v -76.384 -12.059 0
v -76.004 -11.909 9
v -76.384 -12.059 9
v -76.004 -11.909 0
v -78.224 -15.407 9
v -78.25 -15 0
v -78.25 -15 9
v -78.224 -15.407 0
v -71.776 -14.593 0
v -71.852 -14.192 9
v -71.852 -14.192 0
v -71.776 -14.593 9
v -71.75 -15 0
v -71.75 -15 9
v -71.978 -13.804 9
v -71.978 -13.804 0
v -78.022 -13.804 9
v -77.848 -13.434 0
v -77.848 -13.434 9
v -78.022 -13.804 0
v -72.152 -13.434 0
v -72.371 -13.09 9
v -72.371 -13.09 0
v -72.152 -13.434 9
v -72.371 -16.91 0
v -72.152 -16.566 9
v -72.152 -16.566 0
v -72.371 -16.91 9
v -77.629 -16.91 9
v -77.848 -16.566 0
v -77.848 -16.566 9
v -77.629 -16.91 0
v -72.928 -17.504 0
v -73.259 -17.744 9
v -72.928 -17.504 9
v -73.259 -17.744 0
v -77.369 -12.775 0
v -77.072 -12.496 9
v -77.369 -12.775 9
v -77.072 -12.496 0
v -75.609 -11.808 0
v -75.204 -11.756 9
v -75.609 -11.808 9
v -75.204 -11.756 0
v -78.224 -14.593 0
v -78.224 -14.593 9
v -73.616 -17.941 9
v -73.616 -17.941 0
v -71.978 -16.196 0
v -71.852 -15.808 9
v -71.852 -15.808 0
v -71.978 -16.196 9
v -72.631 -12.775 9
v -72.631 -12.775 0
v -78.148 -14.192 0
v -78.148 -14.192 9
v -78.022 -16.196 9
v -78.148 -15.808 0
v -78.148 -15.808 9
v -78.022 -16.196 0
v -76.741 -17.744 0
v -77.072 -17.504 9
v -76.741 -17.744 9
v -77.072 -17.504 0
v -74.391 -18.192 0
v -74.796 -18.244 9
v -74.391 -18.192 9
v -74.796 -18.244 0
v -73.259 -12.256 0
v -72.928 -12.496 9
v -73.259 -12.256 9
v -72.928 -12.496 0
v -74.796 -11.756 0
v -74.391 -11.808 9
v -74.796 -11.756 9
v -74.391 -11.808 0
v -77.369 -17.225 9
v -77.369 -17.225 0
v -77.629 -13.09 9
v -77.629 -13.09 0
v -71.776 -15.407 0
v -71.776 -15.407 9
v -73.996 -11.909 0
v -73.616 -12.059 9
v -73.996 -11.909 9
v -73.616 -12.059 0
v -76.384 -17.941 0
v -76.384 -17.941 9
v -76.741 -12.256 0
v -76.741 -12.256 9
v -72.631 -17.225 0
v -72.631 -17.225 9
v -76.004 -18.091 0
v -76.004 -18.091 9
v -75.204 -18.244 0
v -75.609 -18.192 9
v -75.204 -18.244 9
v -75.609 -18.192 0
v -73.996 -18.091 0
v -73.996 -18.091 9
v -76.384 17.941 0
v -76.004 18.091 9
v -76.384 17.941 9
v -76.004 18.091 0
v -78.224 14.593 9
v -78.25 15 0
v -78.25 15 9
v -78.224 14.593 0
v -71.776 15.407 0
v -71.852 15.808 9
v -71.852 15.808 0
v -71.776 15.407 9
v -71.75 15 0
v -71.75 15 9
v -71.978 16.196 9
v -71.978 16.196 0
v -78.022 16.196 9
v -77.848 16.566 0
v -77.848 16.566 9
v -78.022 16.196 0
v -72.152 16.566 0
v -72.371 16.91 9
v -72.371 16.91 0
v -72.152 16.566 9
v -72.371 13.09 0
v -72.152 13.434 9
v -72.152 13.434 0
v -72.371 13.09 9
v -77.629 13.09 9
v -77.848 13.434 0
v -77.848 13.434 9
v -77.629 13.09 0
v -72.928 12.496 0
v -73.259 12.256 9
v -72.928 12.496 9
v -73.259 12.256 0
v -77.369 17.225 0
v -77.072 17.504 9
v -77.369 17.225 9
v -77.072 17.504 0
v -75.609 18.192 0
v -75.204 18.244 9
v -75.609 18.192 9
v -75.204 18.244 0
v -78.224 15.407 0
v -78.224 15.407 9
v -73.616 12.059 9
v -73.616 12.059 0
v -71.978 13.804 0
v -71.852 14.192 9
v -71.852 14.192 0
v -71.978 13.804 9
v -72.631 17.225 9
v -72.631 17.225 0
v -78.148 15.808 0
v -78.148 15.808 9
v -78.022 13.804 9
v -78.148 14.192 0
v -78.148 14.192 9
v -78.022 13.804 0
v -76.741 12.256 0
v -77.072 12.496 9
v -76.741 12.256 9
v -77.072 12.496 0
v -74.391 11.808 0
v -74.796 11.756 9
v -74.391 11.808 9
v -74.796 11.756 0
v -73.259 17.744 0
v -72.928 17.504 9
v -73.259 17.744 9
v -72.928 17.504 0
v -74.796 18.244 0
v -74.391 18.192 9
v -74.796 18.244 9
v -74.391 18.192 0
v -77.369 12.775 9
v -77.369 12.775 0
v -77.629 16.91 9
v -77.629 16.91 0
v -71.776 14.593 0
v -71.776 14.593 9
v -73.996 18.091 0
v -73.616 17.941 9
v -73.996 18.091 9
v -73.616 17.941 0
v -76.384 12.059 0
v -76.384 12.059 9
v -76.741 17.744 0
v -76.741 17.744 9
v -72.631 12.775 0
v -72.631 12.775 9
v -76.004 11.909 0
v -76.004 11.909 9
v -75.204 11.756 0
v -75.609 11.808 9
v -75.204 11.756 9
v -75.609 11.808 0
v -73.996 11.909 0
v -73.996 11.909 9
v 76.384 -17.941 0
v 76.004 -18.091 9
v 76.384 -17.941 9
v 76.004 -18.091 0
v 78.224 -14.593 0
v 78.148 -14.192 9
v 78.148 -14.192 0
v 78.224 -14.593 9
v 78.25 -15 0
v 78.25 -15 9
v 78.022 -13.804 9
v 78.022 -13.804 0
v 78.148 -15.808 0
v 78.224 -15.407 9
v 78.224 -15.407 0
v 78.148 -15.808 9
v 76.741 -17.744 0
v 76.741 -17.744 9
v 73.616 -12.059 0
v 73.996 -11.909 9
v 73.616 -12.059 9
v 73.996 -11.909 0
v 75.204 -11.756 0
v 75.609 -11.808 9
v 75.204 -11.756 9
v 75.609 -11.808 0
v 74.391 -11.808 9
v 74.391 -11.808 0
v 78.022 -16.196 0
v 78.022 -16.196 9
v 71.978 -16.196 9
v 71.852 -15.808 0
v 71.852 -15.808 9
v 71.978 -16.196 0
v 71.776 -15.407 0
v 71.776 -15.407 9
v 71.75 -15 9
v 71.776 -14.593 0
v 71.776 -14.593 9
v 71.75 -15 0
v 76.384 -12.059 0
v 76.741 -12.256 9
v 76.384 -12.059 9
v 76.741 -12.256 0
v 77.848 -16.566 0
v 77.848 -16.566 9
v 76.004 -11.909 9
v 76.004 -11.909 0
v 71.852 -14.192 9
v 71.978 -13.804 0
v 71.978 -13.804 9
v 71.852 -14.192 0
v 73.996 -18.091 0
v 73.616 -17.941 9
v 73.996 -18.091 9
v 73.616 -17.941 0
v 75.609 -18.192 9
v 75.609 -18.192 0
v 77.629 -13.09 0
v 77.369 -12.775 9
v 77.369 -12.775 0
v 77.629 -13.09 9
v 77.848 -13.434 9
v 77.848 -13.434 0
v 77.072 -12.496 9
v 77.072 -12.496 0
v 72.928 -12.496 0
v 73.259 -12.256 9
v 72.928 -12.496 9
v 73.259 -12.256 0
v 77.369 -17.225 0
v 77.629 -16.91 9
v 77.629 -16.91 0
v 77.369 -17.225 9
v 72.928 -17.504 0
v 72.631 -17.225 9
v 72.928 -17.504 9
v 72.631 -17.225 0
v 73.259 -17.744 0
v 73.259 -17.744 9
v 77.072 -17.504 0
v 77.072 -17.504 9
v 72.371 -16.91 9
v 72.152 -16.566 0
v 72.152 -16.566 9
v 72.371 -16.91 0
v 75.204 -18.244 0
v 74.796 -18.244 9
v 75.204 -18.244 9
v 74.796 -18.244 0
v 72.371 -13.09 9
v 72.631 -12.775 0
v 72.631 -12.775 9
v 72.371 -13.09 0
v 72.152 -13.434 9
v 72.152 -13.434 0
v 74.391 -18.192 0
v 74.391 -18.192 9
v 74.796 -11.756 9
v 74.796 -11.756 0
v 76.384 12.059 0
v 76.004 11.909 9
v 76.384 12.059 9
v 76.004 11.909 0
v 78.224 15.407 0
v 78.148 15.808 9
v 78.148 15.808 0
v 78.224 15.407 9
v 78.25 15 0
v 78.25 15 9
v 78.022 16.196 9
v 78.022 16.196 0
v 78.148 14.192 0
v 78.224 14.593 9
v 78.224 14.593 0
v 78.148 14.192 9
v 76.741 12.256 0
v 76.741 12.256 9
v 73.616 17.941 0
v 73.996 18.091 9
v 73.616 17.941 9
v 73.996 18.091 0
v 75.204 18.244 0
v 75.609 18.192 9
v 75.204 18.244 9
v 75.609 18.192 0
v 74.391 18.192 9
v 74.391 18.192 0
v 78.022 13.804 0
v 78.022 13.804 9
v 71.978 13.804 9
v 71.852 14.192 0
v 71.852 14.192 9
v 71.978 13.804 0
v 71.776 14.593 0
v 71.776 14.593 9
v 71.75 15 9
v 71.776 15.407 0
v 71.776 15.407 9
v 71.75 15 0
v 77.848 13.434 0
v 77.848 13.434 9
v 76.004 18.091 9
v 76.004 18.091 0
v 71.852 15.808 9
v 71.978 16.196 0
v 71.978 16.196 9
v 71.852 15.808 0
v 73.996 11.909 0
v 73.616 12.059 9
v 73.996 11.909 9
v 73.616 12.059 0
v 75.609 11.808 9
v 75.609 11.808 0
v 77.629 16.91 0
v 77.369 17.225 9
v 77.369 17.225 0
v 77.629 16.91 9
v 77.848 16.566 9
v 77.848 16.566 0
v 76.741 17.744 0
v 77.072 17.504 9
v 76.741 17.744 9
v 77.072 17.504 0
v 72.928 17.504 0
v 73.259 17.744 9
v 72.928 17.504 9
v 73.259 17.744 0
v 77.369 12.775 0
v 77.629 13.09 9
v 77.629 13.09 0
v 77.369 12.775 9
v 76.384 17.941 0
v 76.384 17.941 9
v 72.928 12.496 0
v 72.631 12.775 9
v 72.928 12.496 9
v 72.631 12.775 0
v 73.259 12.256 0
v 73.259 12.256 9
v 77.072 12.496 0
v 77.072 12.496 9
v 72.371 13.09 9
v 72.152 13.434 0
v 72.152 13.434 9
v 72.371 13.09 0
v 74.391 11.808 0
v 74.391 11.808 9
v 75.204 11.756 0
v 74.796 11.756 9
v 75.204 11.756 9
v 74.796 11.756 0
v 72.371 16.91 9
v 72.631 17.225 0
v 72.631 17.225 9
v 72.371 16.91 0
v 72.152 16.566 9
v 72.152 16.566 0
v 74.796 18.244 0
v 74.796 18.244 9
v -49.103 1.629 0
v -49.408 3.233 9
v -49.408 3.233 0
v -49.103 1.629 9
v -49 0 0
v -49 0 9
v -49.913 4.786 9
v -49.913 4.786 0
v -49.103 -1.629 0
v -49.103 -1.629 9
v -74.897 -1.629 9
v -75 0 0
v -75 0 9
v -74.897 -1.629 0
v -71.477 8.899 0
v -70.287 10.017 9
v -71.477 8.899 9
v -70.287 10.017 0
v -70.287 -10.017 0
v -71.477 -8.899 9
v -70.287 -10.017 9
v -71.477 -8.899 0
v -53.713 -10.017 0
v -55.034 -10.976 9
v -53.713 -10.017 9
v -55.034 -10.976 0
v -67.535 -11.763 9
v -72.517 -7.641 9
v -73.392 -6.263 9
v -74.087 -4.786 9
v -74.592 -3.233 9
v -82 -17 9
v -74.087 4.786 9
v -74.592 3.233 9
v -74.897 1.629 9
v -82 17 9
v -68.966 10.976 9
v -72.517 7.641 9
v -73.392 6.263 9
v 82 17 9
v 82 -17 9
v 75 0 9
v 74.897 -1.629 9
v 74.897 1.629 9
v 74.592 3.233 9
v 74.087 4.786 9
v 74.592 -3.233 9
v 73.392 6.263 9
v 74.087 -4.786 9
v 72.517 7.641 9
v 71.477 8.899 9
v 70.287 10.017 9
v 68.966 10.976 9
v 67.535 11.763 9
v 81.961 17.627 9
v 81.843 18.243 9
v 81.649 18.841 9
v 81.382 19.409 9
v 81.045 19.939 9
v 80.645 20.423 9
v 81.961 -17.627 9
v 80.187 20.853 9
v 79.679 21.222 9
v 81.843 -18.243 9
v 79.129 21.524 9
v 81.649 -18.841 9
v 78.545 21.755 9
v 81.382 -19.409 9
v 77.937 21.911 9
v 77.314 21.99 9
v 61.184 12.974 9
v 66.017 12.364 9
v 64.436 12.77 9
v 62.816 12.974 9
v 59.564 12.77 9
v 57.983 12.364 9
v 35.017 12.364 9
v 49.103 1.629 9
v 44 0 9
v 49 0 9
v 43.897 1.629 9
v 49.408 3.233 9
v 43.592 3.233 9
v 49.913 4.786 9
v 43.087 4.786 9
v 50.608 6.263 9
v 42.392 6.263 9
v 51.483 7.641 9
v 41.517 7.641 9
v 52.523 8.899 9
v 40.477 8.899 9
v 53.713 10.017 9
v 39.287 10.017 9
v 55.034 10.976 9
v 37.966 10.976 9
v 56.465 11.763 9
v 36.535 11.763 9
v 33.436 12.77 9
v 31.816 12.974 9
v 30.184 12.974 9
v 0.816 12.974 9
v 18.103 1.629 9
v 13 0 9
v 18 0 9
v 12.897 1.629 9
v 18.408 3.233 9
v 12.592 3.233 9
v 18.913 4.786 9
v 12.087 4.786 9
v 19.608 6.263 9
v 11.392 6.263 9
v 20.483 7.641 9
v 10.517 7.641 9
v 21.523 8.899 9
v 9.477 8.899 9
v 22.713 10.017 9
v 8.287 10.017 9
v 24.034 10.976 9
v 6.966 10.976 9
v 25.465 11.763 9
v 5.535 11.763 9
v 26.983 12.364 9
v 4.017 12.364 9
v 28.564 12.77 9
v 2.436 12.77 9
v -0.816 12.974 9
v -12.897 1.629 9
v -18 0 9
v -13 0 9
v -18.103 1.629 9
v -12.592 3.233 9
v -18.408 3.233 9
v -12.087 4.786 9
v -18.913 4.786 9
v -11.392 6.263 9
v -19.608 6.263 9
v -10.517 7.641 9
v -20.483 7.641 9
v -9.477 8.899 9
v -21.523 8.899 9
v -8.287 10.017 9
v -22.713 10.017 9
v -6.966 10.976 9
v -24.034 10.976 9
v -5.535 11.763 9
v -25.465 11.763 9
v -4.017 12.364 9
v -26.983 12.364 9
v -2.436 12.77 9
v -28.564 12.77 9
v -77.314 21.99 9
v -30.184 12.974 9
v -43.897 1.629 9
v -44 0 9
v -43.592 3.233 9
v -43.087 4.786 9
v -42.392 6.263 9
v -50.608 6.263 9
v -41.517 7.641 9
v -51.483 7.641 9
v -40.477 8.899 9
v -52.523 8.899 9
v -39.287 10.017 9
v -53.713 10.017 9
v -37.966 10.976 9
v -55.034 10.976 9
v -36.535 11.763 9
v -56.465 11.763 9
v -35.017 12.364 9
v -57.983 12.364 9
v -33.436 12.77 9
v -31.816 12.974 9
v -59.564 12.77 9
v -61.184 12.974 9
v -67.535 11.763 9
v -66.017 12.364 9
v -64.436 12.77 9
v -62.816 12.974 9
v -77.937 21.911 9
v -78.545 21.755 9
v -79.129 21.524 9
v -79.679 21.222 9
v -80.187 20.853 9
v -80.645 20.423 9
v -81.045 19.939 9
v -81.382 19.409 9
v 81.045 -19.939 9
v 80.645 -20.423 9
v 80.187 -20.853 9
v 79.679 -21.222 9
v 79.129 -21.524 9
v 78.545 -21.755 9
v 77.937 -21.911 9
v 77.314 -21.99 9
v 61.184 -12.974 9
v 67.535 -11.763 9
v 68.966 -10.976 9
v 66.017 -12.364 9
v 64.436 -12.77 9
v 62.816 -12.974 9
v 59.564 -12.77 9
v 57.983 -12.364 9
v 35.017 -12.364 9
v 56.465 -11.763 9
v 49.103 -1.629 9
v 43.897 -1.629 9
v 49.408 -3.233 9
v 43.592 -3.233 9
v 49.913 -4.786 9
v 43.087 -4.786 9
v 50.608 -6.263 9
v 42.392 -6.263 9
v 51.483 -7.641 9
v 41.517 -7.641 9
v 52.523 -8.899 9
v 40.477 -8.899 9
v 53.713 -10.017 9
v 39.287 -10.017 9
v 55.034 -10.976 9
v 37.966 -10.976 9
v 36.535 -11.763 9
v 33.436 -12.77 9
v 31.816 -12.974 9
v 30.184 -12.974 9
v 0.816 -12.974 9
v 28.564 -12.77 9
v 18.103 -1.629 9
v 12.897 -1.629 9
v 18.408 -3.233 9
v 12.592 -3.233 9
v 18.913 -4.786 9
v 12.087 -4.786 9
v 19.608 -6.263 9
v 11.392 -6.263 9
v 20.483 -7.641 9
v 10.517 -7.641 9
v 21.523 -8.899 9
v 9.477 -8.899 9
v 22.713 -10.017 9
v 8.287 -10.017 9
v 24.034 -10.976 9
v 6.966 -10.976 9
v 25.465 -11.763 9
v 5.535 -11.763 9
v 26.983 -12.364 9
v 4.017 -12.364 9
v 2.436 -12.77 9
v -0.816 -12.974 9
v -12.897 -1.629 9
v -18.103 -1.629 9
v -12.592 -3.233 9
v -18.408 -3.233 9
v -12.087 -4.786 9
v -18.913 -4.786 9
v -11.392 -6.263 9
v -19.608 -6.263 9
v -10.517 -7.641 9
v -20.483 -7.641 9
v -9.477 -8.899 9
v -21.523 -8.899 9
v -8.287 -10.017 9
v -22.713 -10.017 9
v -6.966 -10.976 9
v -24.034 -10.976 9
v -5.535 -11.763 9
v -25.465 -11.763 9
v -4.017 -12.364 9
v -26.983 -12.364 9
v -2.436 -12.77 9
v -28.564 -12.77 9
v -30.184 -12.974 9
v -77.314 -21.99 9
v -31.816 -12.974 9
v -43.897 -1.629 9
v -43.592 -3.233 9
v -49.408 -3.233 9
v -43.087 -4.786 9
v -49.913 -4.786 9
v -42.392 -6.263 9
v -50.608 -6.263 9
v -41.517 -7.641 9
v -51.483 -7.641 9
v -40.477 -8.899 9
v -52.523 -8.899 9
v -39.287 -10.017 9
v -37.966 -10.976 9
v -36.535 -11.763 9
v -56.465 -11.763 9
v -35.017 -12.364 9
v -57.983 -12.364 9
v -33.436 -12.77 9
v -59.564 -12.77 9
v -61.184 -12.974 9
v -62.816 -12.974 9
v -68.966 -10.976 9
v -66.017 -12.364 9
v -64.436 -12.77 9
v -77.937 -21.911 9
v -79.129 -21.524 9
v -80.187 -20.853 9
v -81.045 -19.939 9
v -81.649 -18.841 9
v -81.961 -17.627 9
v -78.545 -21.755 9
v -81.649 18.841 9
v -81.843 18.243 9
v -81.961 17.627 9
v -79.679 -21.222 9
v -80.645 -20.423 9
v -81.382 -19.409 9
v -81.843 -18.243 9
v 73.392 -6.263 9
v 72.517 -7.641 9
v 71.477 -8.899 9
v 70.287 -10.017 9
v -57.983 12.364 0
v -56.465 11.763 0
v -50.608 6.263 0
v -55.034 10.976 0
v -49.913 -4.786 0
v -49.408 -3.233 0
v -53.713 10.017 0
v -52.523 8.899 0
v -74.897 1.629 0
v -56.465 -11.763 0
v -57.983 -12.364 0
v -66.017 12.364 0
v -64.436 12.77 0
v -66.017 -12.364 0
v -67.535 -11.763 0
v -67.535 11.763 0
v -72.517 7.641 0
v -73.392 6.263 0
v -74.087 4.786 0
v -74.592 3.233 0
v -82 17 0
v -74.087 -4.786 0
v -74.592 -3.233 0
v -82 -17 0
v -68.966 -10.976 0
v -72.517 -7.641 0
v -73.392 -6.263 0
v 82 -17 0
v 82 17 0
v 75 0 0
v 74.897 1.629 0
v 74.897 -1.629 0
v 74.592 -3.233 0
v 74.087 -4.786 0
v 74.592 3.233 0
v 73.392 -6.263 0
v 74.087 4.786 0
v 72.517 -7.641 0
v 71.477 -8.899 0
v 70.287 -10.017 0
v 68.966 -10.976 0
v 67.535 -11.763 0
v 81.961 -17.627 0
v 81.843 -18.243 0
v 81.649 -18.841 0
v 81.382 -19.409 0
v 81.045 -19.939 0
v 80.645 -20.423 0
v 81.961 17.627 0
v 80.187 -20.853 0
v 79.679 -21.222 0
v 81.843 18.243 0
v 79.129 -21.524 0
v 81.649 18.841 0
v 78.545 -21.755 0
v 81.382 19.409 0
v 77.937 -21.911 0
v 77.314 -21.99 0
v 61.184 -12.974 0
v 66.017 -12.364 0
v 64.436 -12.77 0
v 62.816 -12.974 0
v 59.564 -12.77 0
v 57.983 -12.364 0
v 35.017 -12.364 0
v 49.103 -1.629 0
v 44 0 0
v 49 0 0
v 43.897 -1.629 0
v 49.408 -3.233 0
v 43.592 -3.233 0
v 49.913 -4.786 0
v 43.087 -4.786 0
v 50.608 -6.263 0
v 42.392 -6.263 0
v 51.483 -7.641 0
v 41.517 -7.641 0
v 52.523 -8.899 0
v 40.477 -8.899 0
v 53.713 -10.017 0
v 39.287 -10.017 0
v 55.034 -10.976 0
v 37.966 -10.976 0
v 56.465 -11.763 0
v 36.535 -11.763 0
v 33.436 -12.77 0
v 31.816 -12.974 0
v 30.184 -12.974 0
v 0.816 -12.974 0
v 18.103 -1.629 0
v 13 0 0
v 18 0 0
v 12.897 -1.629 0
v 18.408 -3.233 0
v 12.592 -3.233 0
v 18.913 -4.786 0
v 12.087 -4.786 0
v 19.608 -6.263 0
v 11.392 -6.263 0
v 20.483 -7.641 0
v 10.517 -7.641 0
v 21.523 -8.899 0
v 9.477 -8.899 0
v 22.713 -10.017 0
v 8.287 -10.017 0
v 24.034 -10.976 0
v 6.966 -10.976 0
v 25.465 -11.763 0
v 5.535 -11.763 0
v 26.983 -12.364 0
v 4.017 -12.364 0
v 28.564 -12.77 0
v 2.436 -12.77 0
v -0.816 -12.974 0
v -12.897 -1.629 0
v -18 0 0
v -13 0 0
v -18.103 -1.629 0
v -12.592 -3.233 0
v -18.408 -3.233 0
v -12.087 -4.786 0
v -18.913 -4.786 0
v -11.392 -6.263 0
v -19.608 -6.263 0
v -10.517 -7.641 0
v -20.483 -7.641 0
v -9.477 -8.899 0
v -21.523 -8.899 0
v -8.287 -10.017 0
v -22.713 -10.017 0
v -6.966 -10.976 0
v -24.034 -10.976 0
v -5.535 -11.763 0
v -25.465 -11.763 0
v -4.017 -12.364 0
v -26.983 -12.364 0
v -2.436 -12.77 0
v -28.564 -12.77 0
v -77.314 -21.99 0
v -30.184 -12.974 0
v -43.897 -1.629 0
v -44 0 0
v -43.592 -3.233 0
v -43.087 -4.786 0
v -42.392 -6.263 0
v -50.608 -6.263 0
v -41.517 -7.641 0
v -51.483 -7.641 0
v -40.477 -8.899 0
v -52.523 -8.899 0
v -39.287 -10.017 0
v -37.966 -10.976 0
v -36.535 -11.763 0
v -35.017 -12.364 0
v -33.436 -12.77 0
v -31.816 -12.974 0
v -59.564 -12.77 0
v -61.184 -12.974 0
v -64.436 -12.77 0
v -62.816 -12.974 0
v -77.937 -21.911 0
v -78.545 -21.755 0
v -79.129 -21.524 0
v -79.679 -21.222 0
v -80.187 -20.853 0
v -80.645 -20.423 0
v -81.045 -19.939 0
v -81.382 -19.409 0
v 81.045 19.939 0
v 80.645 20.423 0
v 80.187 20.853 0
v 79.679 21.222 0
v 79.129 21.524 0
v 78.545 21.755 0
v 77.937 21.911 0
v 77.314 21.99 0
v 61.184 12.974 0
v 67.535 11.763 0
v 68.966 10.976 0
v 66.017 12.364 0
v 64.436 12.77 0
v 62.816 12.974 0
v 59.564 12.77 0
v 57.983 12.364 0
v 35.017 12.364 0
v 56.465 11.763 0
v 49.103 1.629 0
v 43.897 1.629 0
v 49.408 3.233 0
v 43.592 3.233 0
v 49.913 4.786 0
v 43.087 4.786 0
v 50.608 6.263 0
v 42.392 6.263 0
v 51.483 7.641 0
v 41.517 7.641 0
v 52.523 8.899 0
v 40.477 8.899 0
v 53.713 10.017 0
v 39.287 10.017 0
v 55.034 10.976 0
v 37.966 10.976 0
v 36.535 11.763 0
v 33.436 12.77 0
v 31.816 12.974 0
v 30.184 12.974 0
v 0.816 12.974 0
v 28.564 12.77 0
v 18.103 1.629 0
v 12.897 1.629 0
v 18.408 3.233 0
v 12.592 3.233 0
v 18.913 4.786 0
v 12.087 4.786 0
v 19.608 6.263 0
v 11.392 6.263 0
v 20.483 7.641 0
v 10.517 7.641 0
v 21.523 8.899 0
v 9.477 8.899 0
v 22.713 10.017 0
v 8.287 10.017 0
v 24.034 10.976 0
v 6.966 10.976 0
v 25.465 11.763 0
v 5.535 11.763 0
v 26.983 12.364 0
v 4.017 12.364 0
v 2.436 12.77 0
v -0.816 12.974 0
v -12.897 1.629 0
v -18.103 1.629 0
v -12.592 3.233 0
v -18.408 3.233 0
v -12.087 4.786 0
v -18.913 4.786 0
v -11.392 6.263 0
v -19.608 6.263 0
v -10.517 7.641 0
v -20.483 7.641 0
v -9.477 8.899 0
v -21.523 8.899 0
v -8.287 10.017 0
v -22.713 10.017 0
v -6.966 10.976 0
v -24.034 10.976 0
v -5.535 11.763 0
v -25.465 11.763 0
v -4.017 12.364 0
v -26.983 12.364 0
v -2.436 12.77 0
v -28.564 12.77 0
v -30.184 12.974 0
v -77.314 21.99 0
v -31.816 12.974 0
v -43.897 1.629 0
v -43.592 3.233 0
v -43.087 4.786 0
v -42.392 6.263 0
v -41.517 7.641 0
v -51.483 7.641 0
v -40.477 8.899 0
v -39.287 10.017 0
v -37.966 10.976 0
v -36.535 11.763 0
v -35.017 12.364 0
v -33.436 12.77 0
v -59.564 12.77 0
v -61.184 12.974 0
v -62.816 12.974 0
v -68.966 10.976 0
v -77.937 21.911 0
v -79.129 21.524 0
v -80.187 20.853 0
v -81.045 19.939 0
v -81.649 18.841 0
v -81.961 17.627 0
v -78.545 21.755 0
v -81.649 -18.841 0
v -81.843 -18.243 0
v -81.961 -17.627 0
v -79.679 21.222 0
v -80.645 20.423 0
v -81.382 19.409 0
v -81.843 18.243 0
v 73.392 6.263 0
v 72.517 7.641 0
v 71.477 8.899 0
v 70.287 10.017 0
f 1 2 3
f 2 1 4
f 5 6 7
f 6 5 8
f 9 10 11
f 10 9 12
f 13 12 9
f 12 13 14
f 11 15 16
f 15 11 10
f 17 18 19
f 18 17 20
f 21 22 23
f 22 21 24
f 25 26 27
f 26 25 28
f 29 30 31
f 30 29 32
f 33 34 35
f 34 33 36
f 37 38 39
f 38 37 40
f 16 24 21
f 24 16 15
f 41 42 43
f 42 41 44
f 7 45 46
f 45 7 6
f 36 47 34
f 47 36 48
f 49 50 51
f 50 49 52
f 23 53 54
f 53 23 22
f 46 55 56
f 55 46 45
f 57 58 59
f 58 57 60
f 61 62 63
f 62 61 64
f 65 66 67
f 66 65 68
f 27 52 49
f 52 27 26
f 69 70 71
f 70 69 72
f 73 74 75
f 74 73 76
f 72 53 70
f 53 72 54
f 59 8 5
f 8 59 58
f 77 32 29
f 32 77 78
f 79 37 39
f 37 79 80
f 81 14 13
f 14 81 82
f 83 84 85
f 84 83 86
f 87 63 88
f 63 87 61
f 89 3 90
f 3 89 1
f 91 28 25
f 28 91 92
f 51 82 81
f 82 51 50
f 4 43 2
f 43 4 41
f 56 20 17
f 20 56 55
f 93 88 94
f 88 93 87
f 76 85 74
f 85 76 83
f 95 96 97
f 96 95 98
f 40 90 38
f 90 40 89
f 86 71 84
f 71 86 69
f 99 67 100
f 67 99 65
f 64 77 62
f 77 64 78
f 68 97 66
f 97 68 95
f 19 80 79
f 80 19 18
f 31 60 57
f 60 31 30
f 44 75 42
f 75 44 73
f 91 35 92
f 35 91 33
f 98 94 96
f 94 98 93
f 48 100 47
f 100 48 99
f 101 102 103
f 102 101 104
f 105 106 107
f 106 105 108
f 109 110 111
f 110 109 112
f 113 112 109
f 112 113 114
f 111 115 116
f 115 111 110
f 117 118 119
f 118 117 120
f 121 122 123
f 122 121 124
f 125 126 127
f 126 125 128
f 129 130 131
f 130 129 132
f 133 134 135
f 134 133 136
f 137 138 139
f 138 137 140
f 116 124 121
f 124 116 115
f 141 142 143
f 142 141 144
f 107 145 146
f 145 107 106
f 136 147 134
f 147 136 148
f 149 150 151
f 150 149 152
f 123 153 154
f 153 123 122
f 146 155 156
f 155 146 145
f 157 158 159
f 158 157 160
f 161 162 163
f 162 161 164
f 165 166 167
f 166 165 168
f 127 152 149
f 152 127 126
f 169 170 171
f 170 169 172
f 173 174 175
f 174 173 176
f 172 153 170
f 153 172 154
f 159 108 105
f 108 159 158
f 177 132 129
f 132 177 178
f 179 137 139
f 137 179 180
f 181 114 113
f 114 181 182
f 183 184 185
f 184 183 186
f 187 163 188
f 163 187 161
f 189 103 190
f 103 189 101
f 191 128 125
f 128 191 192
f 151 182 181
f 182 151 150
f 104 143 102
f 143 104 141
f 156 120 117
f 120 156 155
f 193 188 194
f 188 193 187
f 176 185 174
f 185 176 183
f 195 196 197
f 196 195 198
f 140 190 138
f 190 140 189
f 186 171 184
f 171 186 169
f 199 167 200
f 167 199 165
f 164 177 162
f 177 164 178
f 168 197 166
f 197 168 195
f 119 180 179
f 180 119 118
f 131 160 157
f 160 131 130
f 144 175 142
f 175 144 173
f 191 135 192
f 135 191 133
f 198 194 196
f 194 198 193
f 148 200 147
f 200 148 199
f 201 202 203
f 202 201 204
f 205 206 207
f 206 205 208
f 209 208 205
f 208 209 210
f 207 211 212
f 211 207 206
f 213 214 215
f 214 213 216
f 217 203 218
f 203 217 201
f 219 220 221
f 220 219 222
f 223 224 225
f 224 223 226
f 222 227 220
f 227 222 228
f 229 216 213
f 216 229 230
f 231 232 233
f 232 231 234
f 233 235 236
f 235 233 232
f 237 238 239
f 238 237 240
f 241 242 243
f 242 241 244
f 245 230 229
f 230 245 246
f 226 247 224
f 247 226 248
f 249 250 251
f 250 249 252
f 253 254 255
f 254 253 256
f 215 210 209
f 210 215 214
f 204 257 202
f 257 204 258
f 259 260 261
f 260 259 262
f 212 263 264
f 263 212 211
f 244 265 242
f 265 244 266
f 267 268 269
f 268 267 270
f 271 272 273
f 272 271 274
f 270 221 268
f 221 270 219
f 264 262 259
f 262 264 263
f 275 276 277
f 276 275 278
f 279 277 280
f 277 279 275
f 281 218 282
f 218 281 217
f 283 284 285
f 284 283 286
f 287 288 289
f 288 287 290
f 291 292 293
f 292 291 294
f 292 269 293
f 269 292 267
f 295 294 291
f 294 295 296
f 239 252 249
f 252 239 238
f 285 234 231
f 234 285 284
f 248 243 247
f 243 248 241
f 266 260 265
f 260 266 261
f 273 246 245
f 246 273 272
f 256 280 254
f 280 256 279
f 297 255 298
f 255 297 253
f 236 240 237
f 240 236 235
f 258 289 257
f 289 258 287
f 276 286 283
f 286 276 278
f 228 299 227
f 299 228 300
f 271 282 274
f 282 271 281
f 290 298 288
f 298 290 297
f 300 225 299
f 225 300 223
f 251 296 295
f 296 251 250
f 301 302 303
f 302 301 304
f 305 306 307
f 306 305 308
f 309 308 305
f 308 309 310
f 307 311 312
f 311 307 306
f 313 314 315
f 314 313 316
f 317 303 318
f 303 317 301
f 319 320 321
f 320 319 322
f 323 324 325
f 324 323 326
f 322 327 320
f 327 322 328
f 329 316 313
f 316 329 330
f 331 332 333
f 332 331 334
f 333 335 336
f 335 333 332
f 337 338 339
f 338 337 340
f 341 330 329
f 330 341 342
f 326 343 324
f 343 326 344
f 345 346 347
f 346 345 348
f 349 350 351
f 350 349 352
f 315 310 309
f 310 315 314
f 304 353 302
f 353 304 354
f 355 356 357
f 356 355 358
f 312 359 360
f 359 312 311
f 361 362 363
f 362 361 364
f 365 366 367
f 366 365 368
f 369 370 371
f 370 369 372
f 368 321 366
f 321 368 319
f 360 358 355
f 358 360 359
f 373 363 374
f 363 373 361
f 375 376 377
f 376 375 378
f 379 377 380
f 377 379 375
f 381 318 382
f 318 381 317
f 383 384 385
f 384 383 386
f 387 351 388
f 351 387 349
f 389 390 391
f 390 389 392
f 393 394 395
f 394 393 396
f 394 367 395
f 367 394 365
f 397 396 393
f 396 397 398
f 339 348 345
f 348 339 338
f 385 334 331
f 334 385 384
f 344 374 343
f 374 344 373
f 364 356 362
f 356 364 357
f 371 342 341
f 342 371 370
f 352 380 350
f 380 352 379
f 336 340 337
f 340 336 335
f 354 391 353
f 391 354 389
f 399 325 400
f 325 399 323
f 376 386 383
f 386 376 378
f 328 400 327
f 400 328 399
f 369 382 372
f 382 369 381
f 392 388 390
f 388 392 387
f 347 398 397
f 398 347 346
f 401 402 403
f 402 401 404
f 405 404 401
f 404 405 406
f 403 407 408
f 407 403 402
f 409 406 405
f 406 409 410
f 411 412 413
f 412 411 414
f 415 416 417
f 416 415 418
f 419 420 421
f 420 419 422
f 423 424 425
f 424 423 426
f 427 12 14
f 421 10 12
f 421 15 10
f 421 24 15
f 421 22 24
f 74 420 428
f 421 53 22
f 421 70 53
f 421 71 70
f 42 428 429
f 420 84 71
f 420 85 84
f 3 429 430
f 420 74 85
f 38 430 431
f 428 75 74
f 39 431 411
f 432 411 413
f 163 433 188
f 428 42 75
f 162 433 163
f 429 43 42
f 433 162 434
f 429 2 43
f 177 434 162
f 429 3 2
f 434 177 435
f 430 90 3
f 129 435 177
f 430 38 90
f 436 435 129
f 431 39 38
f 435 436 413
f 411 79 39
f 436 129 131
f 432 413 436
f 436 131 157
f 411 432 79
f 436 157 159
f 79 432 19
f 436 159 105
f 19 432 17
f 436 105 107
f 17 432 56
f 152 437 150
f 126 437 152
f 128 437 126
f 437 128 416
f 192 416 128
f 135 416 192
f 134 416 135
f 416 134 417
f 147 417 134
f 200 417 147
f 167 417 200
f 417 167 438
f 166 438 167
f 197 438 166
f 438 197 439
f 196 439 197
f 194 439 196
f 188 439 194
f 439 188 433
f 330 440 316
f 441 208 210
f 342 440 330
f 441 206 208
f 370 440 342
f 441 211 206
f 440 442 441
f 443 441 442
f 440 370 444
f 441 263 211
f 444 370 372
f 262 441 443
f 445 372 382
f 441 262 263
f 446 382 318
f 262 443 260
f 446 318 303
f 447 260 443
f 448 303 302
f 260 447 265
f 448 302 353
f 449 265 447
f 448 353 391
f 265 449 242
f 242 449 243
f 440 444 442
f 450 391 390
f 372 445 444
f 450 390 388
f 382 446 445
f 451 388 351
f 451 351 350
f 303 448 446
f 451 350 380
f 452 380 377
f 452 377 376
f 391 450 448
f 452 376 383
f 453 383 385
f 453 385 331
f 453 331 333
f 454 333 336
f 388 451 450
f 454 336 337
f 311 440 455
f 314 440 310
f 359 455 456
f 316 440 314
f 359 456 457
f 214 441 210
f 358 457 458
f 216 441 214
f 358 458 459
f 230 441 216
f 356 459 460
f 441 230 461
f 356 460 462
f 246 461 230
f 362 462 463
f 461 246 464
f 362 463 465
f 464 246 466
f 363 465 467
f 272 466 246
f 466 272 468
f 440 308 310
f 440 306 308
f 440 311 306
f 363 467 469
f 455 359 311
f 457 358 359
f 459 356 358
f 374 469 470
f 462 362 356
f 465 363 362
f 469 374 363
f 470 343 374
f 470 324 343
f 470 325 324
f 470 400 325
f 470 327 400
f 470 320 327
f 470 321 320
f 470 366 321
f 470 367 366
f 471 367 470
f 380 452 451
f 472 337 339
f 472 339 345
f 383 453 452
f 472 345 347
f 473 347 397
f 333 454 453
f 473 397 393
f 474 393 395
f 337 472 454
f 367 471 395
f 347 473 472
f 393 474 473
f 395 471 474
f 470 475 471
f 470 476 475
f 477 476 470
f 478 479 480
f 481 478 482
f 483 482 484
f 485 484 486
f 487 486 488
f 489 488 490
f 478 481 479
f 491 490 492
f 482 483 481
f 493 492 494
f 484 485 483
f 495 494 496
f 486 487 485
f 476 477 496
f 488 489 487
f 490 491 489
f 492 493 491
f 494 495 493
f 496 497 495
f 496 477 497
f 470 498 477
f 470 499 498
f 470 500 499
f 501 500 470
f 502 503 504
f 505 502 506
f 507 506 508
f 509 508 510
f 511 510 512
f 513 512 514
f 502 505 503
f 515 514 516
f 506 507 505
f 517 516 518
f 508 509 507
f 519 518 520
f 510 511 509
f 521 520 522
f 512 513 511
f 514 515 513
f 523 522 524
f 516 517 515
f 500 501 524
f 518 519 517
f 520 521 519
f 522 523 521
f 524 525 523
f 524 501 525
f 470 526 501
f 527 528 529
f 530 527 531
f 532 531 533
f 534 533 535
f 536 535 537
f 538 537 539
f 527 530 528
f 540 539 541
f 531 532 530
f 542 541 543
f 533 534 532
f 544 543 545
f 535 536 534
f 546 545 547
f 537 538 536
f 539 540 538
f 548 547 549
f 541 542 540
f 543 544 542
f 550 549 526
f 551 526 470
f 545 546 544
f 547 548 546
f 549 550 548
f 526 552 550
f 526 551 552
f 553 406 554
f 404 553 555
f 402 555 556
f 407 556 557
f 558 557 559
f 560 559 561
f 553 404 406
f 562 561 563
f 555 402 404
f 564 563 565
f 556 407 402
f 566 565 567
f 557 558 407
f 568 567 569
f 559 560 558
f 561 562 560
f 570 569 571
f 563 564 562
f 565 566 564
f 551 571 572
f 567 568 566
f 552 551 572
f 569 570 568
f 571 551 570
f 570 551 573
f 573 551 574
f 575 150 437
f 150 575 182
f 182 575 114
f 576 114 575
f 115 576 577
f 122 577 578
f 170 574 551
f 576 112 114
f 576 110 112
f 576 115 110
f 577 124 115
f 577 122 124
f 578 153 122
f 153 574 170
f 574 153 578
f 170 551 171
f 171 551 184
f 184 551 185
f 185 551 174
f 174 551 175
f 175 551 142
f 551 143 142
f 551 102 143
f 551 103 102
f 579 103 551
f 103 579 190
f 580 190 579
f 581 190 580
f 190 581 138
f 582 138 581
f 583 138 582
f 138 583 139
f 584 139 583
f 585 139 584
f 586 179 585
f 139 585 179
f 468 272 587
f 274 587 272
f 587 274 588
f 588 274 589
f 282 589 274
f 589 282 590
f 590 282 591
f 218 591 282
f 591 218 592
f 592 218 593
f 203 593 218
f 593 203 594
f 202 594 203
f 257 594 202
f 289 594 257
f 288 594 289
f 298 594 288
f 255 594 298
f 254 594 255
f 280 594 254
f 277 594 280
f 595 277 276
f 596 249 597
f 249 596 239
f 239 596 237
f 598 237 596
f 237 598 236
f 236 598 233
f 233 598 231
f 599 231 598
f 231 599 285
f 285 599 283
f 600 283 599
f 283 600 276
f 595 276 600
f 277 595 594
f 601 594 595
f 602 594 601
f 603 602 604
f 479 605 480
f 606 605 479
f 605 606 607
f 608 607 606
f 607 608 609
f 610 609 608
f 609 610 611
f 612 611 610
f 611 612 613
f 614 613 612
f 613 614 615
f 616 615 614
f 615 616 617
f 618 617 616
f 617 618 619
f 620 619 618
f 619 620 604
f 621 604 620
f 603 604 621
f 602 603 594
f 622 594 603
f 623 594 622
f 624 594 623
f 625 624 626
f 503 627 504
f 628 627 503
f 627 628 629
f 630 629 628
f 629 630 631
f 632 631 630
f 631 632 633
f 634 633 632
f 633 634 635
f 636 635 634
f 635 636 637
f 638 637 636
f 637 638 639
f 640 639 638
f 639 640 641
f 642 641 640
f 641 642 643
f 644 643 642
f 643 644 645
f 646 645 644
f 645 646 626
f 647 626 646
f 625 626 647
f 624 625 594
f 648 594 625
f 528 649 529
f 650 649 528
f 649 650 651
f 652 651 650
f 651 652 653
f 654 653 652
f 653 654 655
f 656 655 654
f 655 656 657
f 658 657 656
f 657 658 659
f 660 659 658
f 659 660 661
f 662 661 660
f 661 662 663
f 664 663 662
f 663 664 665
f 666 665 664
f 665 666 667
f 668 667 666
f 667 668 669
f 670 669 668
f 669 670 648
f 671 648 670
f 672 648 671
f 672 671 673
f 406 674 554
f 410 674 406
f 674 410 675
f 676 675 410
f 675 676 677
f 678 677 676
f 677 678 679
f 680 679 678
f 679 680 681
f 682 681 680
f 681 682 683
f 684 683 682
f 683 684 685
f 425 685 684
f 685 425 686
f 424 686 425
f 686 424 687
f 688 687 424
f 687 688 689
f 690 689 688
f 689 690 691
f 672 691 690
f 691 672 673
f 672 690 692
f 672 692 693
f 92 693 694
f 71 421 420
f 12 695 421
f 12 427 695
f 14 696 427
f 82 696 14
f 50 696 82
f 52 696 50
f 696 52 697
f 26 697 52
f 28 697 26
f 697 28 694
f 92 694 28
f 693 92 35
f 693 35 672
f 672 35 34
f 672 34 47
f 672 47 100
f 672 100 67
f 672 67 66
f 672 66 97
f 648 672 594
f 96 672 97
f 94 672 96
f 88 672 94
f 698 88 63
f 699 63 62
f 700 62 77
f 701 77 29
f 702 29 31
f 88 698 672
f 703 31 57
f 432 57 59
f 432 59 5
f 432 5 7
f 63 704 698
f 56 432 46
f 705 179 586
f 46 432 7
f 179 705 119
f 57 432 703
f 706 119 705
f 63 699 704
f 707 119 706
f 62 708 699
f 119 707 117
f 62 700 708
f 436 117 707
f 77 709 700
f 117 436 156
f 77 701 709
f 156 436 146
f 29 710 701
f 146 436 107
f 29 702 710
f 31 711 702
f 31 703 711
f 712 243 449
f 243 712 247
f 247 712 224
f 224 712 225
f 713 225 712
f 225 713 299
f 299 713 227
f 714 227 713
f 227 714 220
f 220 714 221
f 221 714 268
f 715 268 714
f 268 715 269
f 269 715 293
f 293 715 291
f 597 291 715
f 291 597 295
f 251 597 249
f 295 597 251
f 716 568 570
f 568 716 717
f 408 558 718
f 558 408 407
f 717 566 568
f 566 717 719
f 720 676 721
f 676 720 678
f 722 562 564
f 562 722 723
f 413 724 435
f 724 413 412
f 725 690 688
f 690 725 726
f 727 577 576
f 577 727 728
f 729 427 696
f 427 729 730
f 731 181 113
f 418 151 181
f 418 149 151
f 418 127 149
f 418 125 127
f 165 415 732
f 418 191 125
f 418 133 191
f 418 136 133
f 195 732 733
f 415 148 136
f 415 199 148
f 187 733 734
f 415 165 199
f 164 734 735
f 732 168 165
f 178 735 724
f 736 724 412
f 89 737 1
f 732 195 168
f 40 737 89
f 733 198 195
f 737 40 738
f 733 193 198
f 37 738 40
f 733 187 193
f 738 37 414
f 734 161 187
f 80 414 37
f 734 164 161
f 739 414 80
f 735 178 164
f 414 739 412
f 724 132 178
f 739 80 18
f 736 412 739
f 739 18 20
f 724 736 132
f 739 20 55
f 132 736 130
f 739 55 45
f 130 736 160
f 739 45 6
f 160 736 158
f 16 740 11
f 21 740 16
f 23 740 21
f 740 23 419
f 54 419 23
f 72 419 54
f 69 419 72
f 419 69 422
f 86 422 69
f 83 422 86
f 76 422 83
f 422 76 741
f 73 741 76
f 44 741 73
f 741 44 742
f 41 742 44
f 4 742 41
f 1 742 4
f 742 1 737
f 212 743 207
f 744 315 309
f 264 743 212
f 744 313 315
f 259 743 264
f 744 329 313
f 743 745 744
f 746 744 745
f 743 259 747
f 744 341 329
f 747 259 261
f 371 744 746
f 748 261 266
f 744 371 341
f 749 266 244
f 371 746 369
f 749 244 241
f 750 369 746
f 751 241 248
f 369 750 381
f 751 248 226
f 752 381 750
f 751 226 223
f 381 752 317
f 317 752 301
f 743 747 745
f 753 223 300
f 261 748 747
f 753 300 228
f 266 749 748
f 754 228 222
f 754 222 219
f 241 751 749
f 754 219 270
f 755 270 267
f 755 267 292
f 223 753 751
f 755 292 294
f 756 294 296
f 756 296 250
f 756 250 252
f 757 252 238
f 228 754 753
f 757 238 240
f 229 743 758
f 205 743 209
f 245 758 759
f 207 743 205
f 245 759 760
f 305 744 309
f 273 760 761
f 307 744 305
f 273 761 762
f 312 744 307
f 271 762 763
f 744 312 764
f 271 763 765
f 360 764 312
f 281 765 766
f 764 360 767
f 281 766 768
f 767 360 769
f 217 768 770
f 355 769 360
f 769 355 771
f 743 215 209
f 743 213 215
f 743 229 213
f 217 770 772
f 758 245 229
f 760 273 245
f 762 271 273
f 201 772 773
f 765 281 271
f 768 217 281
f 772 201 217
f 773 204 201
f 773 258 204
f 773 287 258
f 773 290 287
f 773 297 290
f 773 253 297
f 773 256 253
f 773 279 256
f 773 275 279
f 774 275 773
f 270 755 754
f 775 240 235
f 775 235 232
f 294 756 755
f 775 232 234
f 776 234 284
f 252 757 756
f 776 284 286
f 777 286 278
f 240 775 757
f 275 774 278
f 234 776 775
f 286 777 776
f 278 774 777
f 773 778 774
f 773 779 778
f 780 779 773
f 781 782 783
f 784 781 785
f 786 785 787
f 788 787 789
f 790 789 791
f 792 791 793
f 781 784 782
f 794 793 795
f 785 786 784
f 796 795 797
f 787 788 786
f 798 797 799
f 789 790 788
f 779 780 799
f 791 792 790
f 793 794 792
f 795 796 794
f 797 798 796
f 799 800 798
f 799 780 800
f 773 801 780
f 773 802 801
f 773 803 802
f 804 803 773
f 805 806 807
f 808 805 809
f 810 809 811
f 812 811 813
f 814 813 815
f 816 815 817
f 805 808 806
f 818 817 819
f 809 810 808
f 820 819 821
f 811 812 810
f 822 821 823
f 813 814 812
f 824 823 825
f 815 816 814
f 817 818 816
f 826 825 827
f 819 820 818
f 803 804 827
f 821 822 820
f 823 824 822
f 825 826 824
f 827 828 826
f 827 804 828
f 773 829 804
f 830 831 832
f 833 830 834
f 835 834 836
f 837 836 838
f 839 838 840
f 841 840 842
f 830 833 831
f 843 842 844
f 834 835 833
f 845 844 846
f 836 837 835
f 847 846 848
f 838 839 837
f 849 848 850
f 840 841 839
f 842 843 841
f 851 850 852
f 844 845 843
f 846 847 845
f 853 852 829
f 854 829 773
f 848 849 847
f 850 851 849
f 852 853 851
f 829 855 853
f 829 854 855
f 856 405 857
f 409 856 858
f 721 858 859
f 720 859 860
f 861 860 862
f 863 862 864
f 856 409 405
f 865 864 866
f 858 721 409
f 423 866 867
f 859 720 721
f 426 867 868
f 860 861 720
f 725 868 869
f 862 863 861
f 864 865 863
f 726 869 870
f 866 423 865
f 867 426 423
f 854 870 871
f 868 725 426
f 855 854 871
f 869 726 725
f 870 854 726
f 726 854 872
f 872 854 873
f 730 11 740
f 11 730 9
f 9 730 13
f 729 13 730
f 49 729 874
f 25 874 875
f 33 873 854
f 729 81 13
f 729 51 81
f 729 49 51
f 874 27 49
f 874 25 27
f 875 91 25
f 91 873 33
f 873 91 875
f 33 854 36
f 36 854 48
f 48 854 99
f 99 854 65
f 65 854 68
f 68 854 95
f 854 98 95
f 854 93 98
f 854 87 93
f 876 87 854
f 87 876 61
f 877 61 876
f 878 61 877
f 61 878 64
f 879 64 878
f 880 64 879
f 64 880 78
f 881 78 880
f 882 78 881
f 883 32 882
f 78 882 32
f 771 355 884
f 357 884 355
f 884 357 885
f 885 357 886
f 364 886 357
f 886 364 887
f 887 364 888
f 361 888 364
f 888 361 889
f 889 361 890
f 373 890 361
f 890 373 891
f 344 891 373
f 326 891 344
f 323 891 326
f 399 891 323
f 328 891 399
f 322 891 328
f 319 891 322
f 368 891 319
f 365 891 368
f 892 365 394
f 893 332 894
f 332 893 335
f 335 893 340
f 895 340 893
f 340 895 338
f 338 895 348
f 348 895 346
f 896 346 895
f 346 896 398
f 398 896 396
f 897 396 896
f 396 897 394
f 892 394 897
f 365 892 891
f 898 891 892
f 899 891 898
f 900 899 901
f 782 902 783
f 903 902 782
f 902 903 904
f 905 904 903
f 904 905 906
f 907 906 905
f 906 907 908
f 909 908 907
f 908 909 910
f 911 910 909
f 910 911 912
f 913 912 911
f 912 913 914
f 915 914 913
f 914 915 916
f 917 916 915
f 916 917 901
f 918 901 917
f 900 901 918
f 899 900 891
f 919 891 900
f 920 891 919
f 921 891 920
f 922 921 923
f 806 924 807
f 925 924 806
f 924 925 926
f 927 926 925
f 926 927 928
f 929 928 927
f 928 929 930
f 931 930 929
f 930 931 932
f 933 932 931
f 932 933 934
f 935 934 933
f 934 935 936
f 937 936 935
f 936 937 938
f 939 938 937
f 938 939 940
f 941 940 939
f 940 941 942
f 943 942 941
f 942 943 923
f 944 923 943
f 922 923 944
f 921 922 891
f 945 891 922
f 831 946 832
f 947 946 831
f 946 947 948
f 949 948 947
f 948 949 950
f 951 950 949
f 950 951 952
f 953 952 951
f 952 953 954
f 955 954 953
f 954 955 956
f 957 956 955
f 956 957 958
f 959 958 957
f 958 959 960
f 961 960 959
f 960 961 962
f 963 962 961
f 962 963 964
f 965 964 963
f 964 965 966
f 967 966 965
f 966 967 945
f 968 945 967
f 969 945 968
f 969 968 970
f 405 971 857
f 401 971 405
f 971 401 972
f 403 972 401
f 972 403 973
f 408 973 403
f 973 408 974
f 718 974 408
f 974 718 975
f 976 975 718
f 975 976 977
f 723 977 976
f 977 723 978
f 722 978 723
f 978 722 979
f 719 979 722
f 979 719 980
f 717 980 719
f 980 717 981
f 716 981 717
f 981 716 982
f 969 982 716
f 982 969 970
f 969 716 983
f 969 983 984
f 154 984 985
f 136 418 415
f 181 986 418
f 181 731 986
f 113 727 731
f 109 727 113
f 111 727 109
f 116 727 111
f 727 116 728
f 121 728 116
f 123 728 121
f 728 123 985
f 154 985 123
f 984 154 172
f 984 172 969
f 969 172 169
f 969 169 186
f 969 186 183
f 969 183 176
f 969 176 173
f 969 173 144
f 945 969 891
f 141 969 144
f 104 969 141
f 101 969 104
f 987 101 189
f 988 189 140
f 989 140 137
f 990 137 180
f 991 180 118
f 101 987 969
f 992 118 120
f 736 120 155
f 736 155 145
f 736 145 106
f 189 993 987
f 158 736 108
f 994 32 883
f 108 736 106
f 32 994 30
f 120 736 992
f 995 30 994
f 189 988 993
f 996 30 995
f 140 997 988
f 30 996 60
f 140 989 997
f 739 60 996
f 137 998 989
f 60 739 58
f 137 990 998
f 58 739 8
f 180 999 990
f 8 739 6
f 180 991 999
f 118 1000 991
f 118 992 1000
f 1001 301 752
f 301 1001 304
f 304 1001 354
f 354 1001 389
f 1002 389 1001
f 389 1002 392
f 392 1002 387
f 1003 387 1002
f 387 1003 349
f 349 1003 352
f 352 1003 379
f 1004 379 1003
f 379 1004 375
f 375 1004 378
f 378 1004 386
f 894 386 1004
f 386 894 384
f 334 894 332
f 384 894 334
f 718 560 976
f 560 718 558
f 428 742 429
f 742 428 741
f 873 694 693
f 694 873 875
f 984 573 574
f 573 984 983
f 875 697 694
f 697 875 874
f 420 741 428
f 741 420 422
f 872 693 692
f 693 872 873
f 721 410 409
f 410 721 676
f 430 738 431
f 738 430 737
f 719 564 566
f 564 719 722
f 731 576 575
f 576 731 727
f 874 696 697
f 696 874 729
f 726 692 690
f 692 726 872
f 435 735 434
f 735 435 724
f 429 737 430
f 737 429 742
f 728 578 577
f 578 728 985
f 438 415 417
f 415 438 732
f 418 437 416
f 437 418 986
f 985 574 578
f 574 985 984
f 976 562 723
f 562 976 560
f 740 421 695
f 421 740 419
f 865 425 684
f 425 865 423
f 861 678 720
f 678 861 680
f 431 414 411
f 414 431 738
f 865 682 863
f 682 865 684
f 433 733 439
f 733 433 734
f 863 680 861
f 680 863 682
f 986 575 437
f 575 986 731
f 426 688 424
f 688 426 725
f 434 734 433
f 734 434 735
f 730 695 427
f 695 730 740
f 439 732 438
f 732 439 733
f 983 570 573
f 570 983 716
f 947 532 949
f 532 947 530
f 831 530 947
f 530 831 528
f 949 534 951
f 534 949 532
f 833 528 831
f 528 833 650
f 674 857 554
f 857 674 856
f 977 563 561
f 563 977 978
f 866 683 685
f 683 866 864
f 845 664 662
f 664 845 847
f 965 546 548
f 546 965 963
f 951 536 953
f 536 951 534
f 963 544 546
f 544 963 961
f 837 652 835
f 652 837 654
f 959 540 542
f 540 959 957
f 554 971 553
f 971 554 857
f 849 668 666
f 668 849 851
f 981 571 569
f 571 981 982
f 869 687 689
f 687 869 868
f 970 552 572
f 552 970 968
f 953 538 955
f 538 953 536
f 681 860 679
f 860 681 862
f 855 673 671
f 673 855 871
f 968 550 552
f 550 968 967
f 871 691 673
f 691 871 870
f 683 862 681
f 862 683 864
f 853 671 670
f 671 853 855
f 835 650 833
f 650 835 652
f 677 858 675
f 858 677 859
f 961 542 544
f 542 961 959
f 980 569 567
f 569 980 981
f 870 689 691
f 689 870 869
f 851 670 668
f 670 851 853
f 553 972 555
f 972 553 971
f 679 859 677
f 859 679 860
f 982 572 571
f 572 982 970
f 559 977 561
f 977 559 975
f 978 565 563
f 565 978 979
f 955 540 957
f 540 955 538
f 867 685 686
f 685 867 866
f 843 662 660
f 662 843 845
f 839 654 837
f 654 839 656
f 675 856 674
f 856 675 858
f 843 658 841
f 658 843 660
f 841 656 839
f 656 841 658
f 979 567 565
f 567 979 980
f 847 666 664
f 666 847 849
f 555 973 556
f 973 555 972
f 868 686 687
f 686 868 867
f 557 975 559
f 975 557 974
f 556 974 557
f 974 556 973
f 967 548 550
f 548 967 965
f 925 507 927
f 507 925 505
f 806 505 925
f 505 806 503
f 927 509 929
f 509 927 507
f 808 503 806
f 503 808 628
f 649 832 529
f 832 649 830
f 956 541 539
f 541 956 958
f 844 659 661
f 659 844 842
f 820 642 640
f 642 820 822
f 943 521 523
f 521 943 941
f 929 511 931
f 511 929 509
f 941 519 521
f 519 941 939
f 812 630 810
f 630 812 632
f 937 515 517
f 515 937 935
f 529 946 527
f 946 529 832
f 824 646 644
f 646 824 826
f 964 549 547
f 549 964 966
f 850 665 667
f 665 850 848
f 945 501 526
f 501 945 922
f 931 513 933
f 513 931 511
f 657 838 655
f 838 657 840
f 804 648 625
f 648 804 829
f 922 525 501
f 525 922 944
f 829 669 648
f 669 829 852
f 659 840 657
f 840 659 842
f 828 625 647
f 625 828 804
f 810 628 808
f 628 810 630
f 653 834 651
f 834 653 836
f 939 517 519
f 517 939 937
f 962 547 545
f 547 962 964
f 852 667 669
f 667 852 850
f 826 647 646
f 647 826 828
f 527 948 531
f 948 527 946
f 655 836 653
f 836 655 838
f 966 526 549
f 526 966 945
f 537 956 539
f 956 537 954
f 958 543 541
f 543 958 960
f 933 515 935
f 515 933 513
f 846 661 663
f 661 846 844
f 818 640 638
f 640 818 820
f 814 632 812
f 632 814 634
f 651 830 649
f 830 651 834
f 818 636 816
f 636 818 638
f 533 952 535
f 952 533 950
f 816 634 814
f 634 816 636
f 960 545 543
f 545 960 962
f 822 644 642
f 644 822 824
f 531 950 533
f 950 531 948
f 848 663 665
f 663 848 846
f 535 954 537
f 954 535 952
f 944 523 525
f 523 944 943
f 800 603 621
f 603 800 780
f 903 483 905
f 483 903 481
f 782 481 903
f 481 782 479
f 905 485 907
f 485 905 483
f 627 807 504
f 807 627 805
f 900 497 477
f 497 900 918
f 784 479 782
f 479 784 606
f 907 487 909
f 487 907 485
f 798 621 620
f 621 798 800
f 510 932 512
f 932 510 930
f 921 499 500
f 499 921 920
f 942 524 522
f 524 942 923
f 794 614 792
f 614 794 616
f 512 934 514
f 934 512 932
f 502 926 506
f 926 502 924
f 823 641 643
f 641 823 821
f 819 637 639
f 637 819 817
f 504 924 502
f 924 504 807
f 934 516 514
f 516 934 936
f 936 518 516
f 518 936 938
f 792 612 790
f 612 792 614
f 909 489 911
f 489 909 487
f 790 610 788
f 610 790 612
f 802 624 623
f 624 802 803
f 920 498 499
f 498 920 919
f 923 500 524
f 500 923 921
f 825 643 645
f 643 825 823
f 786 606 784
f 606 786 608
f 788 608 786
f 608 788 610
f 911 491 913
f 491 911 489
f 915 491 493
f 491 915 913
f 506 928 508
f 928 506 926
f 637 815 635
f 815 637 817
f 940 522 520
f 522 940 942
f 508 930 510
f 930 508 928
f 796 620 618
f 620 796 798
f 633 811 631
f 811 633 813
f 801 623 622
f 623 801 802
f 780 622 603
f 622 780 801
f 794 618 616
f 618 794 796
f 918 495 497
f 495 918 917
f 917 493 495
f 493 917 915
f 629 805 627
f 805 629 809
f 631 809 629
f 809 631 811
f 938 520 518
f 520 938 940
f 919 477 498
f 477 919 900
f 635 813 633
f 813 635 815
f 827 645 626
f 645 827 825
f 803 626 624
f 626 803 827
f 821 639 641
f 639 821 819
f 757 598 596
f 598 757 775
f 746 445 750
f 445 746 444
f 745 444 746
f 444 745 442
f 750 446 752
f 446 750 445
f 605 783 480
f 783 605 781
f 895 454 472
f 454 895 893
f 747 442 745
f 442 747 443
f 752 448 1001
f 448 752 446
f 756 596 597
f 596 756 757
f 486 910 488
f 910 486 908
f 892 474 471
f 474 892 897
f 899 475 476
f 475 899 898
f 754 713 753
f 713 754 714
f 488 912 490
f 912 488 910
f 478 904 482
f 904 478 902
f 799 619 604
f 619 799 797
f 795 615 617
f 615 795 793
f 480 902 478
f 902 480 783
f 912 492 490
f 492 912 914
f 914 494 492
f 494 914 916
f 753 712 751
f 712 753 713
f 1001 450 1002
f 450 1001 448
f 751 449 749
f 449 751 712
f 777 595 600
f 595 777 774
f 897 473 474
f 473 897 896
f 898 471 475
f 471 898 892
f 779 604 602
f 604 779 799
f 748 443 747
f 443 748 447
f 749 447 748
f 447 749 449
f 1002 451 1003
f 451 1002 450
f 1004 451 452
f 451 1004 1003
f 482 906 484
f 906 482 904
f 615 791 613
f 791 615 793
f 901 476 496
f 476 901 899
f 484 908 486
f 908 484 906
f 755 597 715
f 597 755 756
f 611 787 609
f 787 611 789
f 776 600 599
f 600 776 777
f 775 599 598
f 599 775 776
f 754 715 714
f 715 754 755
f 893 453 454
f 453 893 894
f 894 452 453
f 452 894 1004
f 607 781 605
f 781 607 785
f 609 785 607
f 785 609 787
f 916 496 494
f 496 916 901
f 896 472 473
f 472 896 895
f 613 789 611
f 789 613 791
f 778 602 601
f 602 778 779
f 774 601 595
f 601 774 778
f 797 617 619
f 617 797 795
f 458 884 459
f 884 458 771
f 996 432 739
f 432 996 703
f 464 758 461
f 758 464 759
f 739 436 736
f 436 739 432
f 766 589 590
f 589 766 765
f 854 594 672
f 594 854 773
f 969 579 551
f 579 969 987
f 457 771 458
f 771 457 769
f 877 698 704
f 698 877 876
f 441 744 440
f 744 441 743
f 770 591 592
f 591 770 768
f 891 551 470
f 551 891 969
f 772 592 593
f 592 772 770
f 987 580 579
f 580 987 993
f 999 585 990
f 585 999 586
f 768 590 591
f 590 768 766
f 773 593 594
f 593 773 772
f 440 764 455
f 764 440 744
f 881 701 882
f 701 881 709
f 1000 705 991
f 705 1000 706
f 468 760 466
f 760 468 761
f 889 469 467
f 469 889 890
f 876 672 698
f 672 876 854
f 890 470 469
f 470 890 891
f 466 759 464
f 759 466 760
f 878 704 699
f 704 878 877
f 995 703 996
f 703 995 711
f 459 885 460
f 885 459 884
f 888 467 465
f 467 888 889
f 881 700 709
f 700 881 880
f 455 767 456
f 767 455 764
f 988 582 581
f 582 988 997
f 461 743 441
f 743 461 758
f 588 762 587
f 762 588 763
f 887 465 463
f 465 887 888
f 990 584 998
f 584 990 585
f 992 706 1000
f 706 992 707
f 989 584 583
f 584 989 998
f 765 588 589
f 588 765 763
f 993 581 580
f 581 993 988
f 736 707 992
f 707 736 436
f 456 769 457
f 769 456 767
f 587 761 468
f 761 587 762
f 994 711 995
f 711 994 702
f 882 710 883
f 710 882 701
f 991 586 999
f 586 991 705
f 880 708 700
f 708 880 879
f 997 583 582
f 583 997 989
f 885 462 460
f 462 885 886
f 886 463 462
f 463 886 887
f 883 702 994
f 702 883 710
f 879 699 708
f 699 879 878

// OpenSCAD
$fn = 50;


difference() {
	union() {
		hull() {
			translate(v = [-77.0000000000, 17.0000000000, 0]) {
				cylinder(h = 9, r = 5);
			}
			translate(v = [77.0000000000, 17.0000000000, 0]) {
				cylinder(h = 9, r = 5);
			}
			translate(v = [-77.0000000000, -17.0000000000, 0]) {
				cylinder(h = 9, r = 5);
			}
			translate(v = [77.0000000000, -17.0000000000, 0]) {
				cylinder(h = 9, r = 5);
			}
		}
	}
	union() {
		#translate(v = [-75.0000000000, -15.0000000000, -100.0000000000]) {
			cylinder(h = 200, r = 3.2500000000);
		}
		#translate(v = [-75.0000000000, 15.0000000000, -100.0000000000]) {
			cylinder(h = 200, r = 3.2500000000);
		}
		#translate(v = [75.0000000000, -15.0000000000, -100.0000000000]) {
			cylinder(h = 200, r = 3.2500000000);
		}
		#translate(v = [75.0000000000, 15.0000000000, -100.0000000000]) {
			cylinder(h = 200, r = 3.2500000000);
		}
		#translate(v = [-62.0000000000, 0, 0]) {
			cylinder(h = 9, r = 13.0000000000);
		}
		#translate(v = [-31.0000000000, 0, 0]) {
			cylinder(h = 9, r = 13.0000000000);
		}
		#cylinder(h = 9, r = 13.0000000000);
		#translate(v = [31.0000000000, 0, 0]) {
			cylinder(h = 9, r = 13.0000000000);
		}
		#translate(v = [62.0000000000, 0, 0]) {
			cylinder(h = 9, r = 13.0000000000);
		}
	}
}
